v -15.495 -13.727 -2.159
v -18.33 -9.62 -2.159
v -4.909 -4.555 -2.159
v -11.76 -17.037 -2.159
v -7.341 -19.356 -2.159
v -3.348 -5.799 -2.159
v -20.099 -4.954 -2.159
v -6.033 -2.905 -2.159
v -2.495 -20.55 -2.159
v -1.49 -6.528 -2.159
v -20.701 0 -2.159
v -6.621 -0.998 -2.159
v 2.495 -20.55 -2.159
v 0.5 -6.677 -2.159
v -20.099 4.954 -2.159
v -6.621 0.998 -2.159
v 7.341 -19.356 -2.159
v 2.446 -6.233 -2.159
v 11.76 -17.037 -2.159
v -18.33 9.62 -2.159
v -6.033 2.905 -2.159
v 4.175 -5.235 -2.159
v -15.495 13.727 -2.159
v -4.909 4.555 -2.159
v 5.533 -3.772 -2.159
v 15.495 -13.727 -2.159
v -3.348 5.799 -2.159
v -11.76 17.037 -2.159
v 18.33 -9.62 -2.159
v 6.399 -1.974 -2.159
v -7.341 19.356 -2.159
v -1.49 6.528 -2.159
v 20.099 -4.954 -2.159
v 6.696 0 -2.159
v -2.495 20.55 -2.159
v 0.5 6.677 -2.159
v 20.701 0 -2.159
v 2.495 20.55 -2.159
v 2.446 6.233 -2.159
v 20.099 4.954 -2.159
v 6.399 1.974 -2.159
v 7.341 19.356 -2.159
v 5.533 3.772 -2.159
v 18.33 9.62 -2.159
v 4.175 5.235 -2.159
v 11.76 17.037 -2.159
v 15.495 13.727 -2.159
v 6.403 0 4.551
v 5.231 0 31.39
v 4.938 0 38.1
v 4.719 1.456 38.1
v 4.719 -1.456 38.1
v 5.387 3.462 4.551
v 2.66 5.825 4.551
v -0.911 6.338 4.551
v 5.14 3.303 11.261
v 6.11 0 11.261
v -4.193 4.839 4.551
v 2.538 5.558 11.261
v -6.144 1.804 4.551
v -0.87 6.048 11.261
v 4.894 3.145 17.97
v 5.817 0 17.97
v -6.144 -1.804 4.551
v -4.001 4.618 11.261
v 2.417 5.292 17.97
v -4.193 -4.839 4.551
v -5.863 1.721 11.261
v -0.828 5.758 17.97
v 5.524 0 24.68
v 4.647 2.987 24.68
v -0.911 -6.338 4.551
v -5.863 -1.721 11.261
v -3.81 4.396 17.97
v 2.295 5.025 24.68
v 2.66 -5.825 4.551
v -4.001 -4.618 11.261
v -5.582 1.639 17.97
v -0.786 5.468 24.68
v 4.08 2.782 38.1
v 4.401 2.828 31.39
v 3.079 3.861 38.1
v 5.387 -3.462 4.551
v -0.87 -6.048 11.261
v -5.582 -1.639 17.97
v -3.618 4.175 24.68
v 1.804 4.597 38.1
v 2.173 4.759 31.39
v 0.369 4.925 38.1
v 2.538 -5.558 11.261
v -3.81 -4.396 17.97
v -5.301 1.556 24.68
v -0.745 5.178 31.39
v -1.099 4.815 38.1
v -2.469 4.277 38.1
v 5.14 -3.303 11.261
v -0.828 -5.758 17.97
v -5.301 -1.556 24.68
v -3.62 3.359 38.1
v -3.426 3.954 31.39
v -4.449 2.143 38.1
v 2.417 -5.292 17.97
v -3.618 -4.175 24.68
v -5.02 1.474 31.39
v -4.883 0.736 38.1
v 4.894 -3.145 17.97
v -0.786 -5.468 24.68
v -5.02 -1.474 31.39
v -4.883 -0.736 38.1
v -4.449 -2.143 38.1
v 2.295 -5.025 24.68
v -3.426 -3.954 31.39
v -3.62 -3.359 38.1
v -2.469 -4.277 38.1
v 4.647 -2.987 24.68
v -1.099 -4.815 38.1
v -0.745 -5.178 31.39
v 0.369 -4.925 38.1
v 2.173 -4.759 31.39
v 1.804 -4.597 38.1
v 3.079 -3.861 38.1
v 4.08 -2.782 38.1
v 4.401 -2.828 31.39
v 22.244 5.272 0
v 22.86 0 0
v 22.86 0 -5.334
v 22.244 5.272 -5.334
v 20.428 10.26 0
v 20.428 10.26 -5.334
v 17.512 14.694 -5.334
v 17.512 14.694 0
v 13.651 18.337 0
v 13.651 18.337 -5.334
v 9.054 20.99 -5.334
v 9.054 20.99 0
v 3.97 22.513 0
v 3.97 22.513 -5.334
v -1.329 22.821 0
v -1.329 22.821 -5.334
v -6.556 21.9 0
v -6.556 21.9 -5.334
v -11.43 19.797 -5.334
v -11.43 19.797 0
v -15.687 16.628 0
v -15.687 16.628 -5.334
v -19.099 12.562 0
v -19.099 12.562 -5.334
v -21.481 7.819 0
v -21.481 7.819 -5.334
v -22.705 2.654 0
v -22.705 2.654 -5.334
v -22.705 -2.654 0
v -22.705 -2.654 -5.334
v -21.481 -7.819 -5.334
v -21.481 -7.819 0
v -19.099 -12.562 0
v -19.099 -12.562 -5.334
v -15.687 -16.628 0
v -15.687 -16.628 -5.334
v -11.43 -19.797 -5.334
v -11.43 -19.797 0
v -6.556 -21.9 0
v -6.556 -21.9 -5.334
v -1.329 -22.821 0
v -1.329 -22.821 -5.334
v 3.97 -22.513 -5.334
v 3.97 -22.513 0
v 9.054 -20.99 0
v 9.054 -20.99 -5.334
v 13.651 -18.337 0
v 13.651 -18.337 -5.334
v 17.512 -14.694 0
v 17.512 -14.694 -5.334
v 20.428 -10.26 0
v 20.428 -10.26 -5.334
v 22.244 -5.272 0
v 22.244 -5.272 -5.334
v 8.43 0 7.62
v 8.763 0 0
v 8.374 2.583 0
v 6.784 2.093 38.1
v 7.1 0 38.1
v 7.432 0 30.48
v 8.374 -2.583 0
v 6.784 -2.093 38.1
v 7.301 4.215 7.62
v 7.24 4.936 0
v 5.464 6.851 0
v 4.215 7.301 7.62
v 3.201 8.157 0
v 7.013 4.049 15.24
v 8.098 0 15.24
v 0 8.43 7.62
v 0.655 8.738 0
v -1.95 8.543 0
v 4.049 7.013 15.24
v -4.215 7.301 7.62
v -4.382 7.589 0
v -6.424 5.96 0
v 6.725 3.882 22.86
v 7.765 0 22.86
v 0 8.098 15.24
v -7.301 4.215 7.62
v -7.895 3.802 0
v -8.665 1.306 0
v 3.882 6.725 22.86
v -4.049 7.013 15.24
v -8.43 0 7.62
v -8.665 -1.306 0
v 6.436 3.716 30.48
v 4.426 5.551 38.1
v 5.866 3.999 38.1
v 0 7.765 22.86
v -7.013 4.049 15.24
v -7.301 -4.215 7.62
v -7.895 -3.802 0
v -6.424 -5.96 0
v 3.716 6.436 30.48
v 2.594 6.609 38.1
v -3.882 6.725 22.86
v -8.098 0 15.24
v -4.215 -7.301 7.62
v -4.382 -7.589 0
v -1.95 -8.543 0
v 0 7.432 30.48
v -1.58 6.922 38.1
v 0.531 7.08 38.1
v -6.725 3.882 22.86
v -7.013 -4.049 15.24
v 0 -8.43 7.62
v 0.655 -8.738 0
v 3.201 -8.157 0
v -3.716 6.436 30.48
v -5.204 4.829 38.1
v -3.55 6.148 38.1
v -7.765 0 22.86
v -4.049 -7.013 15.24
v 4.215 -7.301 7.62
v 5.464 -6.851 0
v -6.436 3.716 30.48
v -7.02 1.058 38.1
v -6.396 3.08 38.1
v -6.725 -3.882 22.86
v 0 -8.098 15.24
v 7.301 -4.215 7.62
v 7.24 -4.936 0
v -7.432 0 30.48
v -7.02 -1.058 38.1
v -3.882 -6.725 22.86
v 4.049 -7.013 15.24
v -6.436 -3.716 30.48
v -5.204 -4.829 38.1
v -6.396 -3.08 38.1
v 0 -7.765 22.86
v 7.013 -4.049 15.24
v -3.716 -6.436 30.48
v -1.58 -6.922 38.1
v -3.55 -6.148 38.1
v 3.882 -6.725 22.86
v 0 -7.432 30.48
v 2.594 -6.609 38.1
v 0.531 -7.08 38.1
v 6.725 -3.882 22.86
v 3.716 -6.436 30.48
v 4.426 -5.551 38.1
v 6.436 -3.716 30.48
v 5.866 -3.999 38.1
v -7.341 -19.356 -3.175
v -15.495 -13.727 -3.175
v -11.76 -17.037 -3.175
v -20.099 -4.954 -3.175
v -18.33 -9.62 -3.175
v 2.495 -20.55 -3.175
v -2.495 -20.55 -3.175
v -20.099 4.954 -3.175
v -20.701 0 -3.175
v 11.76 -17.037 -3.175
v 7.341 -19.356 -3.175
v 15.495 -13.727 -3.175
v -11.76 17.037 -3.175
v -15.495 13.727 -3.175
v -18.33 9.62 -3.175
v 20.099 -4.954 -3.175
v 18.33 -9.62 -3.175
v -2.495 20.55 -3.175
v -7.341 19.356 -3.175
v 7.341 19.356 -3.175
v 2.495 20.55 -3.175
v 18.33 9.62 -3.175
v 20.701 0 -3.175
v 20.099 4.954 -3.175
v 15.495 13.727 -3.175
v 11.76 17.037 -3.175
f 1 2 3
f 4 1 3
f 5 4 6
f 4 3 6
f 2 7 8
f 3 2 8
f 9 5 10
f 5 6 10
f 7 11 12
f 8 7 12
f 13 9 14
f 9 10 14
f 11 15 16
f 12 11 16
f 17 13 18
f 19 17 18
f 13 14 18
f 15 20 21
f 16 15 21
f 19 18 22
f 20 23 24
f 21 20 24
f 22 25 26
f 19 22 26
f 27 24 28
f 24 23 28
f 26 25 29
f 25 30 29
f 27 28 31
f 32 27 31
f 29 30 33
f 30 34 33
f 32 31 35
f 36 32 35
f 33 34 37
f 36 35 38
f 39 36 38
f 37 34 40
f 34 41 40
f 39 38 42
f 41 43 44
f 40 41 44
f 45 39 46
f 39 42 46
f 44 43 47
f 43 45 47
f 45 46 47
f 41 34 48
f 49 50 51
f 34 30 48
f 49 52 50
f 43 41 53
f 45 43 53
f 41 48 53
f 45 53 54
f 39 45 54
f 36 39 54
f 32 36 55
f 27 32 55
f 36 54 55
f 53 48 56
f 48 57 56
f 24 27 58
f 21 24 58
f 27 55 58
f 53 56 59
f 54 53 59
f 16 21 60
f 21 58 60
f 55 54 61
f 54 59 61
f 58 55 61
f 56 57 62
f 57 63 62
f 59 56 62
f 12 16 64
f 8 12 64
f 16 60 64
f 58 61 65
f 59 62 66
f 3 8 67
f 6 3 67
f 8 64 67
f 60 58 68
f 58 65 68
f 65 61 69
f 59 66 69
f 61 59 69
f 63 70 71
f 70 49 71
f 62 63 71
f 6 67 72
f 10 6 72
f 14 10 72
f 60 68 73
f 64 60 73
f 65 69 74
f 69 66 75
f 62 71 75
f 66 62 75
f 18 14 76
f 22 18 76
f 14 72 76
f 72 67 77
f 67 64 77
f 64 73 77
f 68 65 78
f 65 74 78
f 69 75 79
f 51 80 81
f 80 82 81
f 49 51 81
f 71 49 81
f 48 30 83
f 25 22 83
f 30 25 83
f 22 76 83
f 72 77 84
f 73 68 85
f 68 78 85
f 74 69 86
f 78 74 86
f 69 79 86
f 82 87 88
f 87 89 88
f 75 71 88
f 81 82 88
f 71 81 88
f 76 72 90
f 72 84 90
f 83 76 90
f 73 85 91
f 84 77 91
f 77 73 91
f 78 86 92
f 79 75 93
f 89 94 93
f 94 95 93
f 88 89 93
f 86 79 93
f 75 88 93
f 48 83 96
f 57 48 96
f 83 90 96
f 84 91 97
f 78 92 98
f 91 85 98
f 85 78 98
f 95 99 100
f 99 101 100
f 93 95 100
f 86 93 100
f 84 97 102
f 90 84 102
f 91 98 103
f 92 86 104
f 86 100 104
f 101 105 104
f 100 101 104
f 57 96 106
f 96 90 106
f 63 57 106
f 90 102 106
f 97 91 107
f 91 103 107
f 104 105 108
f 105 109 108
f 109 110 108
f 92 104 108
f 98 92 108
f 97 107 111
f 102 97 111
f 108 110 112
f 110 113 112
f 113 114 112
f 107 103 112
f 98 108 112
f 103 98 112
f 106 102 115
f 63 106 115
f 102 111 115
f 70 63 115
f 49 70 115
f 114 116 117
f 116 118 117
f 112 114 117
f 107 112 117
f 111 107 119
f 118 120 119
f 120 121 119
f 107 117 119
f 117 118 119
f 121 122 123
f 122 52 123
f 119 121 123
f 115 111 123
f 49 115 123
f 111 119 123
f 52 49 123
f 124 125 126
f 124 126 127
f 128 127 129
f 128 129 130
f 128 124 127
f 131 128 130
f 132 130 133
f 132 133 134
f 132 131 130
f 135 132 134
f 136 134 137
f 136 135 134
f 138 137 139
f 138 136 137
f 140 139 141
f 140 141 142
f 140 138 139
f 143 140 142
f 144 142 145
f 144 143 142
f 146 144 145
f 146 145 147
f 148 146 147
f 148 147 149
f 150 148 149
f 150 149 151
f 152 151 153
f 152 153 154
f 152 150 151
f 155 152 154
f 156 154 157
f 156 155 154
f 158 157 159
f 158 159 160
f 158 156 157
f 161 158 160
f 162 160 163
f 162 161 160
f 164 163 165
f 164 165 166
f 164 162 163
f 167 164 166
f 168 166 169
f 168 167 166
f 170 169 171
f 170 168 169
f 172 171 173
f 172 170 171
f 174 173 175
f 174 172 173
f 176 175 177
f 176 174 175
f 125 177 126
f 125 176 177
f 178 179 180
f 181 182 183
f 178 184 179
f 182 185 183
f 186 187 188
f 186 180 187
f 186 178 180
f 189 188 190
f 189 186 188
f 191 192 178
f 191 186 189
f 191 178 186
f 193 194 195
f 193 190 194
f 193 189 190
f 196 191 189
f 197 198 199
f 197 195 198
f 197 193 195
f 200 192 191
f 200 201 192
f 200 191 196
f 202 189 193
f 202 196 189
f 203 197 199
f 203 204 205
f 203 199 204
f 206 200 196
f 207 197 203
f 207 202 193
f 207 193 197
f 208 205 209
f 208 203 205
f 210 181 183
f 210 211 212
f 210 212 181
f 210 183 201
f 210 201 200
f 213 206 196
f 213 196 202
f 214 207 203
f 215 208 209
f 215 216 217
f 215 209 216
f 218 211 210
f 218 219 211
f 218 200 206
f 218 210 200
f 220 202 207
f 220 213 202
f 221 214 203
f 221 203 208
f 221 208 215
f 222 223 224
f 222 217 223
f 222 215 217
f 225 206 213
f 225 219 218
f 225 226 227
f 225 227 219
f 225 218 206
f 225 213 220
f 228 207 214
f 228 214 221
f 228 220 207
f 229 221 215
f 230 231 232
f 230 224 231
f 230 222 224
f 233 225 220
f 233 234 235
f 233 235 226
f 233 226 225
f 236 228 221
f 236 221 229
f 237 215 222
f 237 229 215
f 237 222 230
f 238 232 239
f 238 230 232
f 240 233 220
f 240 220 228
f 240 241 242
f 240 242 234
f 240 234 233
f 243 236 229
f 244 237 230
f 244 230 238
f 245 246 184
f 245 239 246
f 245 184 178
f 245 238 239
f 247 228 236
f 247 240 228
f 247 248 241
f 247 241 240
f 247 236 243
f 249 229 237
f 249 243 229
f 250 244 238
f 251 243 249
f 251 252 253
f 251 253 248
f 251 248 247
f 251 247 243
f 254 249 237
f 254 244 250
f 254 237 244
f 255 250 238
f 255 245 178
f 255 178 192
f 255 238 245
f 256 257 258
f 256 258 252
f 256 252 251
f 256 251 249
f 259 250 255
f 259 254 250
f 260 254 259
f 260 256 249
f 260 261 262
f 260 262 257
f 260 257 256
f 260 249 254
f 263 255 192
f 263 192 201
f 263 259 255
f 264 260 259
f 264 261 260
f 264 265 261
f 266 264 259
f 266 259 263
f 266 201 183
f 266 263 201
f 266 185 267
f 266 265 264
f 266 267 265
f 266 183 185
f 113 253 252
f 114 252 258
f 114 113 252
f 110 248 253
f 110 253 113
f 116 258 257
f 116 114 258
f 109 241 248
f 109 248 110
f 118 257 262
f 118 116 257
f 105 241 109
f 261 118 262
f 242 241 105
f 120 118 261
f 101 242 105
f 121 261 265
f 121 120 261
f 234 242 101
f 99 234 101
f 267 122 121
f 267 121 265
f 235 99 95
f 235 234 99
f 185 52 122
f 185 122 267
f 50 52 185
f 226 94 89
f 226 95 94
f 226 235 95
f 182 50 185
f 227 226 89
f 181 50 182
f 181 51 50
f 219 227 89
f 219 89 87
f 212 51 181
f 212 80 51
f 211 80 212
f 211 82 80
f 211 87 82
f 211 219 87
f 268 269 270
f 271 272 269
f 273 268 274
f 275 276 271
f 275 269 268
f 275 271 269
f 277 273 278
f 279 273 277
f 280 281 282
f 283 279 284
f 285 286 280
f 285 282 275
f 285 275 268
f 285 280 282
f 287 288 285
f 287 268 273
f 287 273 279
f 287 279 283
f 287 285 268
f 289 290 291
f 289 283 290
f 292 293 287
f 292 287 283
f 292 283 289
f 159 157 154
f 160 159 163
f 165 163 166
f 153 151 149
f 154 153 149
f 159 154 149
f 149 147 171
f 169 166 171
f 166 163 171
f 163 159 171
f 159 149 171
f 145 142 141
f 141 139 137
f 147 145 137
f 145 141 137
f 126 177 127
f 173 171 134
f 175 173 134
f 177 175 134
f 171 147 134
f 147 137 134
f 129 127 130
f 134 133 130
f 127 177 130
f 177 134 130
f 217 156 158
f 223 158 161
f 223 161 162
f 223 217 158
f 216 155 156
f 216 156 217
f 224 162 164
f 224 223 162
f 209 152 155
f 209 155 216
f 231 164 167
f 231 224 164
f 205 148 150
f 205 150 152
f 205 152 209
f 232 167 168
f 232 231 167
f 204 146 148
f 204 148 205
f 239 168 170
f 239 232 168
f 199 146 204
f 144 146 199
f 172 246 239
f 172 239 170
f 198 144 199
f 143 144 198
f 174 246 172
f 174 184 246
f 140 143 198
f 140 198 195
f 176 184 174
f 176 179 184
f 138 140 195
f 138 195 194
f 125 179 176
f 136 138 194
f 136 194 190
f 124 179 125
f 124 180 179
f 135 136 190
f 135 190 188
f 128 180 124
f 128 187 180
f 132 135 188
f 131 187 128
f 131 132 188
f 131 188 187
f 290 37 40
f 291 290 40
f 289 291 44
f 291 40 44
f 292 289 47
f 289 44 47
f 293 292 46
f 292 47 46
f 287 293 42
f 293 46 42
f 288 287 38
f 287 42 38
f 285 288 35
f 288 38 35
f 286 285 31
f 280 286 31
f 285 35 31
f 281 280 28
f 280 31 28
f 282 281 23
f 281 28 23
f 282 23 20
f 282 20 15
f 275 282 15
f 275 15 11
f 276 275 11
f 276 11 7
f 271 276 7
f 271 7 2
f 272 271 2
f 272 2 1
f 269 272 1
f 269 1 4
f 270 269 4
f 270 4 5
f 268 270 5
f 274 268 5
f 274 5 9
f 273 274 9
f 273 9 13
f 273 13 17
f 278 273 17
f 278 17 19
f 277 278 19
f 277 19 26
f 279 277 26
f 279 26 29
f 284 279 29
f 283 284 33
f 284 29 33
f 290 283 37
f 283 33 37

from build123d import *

# Parameters (mm, degrees)
F0_R     = 22.86
F1_DEPTH = 5.334
F2_R     = 8.763
F3_DEPTH = 38.1
F3_TAPER = 2.5
F4_T     = -2.159


with BuildPart() as f1:
    # F0 (on Top) → F1 (new body)
    with BuildSketch(Plane.XY):
        Circle(F0_R)
    extrude(amount=-F1_DEPTH)

    # F2 (on Top) → F3 (join)
    with BuildSketch(Plane.XY):
        Circle(F2_R)
    extrude(amount=F3_DEPTH, taper=F3_TAPER)

    # F4
    f4_openings = [f1.faces().sort_by_distance(p)[0] for p in [
        (0, 0, 38.1),
    ]]
    offset(amount=F4_T, openings=f4_openings, kind=Kind.INTERSECTION)


solid = f1.part
